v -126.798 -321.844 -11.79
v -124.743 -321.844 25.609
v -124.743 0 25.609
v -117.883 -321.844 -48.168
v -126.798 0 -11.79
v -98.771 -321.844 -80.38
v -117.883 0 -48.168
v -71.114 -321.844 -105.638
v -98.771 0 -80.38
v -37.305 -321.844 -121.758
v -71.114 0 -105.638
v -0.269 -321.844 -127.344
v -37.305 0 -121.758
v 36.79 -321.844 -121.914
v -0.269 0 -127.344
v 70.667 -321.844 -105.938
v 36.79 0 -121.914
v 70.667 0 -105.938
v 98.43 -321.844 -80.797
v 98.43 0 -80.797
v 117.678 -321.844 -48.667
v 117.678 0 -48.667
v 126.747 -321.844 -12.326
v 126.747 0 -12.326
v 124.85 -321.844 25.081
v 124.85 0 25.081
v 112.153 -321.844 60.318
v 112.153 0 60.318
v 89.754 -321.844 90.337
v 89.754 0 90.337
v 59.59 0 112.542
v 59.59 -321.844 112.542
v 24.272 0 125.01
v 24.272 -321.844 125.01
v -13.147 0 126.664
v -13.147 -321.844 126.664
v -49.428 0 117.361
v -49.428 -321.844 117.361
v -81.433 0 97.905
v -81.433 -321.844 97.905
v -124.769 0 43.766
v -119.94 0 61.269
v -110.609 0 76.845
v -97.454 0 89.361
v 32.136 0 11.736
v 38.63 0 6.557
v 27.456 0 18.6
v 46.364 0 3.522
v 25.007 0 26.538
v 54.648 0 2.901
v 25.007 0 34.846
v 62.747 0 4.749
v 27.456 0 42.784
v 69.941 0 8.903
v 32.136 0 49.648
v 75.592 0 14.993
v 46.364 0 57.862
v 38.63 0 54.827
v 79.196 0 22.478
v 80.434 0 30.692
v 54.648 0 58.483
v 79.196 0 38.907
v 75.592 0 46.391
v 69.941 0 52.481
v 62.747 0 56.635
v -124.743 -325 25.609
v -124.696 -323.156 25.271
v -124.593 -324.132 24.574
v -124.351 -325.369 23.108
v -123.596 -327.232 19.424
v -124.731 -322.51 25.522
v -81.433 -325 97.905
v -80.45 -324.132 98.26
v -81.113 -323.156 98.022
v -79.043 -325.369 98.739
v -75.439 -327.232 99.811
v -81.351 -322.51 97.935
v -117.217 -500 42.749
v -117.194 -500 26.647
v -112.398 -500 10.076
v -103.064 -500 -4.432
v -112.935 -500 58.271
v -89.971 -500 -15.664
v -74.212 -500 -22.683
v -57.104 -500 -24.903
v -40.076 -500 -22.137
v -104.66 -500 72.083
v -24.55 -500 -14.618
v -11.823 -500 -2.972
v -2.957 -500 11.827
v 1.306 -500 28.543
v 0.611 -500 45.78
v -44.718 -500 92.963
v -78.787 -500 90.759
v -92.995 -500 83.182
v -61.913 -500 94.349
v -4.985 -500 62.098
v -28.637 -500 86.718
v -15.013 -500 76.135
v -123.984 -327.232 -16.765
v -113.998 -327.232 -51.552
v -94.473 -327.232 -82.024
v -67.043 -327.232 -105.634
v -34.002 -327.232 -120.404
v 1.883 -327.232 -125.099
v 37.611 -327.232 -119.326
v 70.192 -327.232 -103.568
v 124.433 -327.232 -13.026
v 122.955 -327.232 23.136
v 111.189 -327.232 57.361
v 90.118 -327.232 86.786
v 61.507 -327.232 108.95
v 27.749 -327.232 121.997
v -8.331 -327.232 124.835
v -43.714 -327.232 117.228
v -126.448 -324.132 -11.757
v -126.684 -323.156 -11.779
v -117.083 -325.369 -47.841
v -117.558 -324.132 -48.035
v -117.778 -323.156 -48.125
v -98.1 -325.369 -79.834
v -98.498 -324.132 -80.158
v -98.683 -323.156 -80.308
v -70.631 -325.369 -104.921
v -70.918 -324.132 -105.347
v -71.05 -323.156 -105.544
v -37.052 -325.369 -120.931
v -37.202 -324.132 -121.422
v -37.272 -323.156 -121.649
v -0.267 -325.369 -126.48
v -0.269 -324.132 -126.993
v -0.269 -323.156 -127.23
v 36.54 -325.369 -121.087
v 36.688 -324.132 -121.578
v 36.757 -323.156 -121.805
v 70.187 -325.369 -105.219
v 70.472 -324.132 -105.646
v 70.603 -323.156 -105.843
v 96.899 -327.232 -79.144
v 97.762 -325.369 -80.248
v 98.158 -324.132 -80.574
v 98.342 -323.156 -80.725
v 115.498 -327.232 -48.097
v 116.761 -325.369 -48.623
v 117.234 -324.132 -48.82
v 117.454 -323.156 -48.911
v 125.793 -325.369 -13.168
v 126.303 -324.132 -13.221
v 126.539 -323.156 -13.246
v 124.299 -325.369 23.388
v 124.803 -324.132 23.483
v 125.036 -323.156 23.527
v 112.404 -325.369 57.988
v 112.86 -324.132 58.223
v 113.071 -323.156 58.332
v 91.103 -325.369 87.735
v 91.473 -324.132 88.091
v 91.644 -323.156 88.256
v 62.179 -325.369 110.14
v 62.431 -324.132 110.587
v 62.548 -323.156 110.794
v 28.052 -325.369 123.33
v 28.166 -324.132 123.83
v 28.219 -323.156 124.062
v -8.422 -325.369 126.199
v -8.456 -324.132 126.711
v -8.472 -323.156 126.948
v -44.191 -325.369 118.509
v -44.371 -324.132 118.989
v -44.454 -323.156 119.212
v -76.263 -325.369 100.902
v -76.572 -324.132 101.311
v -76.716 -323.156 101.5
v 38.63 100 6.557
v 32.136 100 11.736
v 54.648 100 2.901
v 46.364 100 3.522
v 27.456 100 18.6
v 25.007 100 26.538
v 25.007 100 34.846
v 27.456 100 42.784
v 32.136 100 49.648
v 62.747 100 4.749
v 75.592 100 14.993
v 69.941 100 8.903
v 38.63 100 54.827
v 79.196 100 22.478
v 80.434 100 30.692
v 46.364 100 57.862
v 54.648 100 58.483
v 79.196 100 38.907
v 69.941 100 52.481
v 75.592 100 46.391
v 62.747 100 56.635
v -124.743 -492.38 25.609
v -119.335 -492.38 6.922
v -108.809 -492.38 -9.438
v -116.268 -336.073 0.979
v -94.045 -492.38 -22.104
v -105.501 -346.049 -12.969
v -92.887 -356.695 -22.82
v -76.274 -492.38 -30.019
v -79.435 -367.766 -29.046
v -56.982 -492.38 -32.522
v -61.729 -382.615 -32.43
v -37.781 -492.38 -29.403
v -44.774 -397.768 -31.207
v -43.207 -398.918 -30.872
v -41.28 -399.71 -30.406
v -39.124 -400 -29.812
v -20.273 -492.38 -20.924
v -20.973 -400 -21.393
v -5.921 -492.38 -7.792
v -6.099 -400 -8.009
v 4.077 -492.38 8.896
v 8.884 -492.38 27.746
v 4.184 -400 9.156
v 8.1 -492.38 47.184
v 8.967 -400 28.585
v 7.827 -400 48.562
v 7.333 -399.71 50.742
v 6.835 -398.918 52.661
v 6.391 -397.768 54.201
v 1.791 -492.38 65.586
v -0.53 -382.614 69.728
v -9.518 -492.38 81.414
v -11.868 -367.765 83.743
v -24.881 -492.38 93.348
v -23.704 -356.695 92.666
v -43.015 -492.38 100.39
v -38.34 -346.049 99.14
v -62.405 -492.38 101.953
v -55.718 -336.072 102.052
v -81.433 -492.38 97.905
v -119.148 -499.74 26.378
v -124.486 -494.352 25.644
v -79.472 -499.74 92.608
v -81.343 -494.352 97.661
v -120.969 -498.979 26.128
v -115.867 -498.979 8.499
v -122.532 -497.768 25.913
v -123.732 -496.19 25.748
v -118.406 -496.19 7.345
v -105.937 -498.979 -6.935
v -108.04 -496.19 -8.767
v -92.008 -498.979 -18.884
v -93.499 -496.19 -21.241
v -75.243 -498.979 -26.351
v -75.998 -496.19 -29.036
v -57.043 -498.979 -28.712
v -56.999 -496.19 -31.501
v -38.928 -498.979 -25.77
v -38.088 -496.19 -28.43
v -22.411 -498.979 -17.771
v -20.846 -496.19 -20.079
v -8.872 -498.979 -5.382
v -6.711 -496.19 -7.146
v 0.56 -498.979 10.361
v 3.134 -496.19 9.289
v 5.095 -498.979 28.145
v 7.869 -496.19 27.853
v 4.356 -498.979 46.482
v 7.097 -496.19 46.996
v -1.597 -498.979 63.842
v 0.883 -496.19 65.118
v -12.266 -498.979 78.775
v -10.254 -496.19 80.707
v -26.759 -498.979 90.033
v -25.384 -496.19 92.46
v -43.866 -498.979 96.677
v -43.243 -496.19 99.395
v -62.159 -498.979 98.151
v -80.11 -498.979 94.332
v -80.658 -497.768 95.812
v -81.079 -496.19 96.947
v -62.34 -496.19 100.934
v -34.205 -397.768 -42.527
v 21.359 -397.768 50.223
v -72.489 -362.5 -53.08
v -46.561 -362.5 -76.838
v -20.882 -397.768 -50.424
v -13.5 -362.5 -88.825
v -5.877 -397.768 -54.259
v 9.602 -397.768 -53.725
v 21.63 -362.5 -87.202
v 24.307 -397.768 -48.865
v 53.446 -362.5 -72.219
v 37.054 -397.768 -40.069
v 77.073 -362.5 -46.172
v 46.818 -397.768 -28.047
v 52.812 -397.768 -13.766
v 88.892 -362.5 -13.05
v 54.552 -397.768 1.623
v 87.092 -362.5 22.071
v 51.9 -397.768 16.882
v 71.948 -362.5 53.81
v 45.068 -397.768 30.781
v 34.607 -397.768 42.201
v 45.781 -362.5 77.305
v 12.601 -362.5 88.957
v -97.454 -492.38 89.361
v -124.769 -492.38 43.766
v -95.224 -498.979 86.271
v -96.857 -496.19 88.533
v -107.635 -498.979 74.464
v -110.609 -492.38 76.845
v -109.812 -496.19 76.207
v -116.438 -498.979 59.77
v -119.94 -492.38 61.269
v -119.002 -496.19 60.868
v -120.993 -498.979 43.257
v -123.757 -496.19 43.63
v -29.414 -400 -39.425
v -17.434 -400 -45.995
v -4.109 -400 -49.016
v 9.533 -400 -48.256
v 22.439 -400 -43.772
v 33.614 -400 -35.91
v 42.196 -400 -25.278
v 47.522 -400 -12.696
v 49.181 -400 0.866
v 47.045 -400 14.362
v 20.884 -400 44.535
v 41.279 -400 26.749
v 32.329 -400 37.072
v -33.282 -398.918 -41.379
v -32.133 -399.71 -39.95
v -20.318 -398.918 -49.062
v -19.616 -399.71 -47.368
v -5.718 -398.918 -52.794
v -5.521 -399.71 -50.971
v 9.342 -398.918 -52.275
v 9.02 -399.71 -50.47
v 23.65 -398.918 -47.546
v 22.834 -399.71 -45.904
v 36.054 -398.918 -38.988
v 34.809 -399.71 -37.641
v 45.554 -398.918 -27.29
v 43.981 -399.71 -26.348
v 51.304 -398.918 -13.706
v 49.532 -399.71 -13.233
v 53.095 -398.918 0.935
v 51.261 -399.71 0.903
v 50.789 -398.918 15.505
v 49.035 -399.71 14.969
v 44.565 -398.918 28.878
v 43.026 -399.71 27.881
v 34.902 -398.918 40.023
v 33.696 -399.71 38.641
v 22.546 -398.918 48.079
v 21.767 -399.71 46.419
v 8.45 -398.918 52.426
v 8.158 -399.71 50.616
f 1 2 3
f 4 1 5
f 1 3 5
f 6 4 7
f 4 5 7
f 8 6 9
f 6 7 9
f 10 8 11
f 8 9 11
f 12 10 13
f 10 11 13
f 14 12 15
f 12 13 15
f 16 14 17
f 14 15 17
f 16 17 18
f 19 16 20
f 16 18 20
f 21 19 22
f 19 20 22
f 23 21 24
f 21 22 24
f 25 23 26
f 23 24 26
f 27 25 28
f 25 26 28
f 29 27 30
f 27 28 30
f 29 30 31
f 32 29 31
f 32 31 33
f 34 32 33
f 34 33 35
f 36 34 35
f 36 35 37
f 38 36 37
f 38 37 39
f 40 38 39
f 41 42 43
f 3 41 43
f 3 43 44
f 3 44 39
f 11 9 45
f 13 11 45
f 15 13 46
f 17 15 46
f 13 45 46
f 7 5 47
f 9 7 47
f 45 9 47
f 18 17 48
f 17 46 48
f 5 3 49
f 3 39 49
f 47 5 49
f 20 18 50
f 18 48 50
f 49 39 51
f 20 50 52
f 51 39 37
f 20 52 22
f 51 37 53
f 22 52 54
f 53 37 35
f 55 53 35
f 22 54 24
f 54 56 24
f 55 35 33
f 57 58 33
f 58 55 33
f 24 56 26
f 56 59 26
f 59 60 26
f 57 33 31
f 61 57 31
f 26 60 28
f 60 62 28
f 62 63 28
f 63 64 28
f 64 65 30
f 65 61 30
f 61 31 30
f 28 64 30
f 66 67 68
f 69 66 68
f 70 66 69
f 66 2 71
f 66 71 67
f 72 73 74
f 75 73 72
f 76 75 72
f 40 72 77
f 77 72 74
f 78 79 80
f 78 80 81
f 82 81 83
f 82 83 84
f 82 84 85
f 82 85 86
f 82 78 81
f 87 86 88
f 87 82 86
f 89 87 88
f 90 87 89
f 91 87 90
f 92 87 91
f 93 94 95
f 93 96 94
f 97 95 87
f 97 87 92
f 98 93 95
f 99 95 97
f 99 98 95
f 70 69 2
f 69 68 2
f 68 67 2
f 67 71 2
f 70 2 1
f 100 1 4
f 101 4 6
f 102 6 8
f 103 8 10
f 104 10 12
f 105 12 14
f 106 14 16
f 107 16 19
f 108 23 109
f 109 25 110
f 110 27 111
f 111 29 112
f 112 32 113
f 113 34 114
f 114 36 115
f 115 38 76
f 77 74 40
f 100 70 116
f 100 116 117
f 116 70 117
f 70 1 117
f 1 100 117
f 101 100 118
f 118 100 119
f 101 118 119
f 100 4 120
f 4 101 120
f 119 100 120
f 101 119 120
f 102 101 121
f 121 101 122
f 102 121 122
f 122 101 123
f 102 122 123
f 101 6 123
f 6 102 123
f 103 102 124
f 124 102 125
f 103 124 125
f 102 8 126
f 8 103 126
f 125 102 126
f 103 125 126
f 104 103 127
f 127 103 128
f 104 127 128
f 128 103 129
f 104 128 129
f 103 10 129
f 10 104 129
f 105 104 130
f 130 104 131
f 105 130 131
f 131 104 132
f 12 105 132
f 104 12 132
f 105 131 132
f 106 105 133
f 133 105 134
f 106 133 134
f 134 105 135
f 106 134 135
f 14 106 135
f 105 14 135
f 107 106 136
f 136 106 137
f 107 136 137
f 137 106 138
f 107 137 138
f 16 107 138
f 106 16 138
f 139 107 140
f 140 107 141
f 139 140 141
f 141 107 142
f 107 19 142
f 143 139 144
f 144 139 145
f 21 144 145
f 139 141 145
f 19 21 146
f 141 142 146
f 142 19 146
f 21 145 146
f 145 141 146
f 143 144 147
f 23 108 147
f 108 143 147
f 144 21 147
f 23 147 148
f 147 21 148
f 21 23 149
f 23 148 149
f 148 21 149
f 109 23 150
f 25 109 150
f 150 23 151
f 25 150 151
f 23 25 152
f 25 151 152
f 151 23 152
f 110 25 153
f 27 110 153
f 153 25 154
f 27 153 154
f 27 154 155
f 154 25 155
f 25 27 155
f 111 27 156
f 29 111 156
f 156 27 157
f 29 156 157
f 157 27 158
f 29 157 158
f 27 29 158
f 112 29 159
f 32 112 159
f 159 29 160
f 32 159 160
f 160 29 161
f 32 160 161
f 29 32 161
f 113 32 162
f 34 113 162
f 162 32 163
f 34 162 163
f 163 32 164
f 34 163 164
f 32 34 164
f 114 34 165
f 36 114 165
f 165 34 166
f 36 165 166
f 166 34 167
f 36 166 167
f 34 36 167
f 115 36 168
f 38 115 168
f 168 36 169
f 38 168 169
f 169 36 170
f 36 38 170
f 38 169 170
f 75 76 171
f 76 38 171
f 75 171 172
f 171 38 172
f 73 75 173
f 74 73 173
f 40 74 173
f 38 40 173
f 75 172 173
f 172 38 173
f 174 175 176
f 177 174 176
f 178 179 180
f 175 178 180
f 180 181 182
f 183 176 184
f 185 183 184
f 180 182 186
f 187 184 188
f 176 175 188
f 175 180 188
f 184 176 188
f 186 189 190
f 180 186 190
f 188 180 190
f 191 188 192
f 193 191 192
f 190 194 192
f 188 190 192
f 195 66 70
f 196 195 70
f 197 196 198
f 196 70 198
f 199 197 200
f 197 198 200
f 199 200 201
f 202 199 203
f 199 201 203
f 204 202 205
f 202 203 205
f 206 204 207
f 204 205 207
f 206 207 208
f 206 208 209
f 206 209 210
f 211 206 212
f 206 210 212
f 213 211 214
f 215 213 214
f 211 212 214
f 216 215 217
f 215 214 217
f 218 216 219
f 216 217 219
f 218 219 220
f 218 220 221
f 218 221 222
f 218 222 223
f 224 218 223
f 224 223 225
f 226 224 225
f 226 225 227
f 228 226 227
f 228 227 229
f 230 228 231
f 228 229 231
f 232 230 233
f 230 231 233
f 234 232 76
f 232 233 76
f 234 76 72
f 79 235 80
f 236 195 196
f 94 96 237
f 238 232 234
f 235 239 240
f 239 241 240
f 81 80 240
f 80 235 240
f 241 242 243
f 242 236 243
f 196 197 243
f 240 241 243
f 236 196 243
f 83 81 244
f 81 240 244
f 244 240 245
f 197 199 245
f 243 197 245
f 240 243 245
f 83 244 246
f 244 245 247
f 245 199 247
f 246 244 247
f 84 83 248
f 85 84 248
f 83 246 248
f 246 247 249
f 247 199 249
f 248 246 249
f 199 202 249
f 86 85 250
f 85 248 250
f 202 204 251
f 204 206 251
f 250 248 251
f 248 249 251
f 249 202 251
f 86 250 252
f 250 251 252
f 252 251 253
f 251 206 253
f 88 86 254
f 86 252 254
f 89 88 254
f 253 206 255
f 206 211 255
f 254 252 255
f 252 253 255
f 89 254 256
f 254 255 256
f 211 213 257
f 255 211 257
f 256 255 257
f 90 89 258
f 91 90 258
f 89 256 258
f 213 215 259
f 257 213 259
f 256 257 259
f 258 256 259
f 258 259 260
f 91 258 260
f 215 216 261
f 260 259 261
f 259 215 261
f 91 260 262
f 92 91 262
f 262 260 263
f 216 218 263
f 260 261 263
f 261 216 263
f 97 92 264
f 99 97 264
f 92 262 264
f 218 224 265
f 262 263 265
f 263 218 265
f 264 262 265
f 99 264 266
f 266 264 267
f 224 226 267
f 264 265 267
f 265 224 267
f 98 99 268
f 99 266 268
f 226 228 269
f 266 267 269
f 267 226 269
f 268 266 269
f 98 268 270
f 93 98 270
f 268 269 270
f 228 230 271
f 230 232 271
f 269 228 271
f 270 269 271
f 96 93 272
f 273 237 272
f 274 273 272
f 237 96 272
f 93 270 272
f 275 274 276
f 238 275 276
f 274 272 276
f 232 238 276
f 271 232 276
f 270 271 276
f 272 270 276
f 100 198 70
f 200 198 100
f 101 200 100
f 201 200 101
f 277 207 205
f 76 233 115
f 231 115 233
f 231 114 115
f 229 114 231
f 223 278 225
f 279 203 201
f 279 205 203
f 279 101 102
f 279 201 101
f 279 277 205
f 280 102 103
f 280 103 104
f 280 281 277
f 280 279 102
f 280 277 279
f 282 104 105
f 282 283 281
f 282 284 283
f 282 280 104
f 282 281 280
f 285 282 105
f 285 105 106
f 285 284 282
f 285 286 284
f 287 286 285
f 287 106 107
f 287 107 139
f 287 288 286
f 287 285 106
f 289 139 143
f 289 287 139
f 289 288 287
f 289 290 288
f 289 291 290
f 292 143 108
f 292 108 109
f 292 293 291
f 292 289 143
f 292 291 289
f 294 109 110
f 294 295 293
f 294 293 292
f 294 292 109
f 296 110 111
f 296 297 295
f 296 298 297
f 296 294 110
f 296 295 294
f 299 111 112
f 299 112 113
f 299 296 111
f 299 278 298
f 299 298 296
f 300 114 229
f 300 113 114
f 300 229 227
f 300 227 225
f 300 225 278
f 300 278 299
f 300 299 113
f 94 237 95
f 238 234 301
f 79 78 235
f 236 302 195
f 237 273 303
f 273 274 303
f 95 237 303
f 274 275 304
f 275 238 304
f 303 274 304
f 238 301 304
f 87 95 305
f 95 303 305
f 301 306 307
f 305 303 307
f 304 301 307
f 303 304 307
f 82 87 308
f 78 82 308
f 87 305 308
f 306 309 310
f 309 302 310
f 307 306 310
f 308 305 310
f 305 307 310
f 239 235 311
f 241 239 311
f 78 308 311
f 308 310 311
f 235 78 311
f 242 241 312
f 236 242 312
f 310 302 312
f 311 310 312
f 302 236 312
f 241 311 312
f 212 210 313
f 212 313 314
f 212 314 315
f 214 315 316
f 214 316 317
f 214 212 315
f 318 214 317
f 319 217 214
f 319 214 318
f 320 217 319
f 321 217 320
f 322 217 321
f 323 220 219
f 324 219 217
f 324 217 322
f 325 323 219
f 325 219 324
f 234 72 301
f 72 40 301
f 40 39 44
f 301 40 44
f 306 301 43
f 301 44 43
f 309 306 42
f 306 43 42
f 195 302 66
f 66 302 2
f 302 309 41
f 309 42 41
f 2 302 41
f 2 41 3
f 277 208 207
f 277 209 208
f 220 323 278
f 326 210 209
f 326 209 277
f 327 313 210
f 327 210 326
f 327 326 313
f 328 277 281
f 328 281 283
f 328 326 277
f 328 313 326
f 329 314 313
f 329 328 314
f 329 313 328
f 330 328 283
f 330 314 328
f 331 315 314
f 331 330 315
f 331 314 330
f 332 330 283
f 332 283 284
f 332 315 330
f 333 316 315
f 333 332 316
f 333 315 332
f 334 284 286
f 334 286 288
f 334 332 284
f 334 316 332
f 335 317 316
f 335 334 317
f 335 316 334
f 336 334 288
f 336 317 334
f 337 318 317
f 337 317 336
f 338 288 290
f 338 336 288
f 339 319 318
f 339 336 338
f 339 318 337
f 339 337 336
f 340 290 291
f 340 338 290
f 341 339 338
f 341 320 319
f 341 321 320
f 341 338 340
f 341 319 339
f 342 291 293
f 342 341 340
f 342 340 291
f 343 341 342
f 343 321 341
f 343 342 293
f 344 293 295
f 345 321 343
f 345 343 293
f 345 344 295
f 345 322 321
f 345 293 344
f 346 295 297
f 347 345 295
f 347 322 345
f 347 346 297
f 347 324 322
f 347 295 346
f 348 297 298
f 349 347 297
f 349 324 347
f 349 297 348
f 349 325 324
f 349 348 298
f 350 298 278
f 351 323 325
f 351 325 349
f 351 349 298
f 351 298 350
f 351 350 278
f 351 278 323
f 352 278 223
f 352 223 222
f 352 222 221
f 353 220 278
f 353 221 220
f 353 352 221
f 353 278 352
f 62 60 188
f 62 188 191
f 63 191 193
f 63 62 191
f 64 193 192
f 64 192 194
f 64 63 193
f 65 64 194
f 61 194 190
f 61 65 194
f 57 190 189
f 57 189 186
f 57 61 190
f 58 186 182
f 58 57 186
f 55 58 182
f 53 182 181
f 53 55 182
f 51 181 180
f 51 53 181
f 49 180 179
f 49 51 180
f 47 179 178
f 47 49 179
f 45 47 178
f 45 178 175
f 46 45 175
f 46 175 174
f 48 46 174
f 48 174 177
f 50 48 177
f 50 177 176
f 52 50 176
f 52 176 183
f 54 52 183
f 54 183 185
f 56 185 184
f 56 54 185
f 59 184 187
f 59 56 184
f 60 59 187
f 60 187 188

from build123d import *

# Parameters (mm, degrees)
F1_DEPTH    = 500
F0_R        = 27.8691255666
F2_DEPTH    = 400
F3_DEPTH    = 100
F4_SIZE     = 75
F5_R        = 7.62
F6_R        = 7.62
F7_T4_ANGLE = 328.4905382485
F7_S5_R     = 67.3118629199
F7_T6_DEPTH = 190


# Not quite as in the source:
# - a fillet or chamfer that OpenCascade refuses, or shapes differently, is made with other operations: its cross-section is extruded or revolved along the edge and cut away or added


with BuildPart() as f1:
    # F0 (on Front) → F1 (new body)
    with BuildSketch(Plane.XZ):
        with BuildLine():
            ThreePointArc((9.2527889353, 34.7813107073), (-19.6042711183, 90.0272610229), (-81.4330097892, 97.9045711963))
            ThreePointArc((-81.4330097892, 97.9045711963), (-109.241980875, 65.4433324256), (-124.7430483487, 25.6088272504))
            ThreePointArc((-124.7430483487, 25.6088272504), (-53.4620995229, -32.373396615), (9.2527889353, 34.7813107073))
        make_face()
        with BuildLine():
            ThreePointArc((-124.7430483487, 25.6088272504), (-109.241980875, 65.4433324256), (-81.4330097892, 97.9045711963))
            ThreePointArc((-81.4330097892, 97.9045711963), (-115.8022592462, 69.3733827123), (-124.7430483487, 25.6088272504))
        make_face()
    extrude(amount=F1_DEPTH)

    # F0 (on Front) → F2 (join)
    with BuildSketch(Plane.XZ):
        with BuildLine():
            ThreePointArc((-124.7430483487, 25.6088272504), (-12.870314303, -126.6925220927), (127.3445724971, 0))
            ThreePointArc((127.3445724971, 0), (54.0674963619, 115.2967735091), (-81.4330097892, 97.9045711963))
            ThreePointArc((-81.4330097892, 97.9045711963), (-19.6042711183, 90.0272610229), (9.2527889353, 34.7813107073))
            ThreePointArc((9.2527889353, 34.7813107073), (-53.4620995229, -32.373396615), (-124.7430483487, 25.6088272504))
        make_face()
        with Locations((52.5650605559, 30.6920967996)):
            Circle(F0_R, mode=Mode.SUBTRACT)
        with Locations((52.5650605559, 30.6920967996)):
            Circle(F0_R)
    extrude(amount=F2_DEPTH)

    # F0 (on Front) → F3 (join)
    with BuildSketch(Plane.XZ):
        with Locations((52.5650605559, 30.6920967996)):
            Circle(F0_R)
    extrude(amount=-F3_DEPTH)

    # F4
    f4_edges = [f1.edges().sort_by_distance(p)[0] for p in [
        (109.241981, -400, -65.443332),
    ]]
    chamfer(f4_edges, length=F4_SIZE)

    # F5
    f5_edges = [f1.edges().sort_by_distance(p)[0] for p in [
        (-125.370937, -500, 34.781311),
    ]]
    fillet(f5_edges, radius=F5_R)

    # F6
    f6_edges = [f1.edges().sort_by_distance(p)[0] for p in [
        (44.903561, -400, -26.900269),
    ]]
    fillet(f6_edges, radius=F6_R)

    # F7: fillet of radius 7.62 on 1 edges, made by hand


with BuildPart() as f7_tool2:
    # F7_s3 → F7_t4 (revolve)
    with BuildSketch(Plane(origin=(0, 0, 0), x_dir=(0, 1, 0), z_dir=(0.2616792898, 0, 0.9651548836))):
        with BuildLine():
            ThreePointArc((-327.2318463274, 125.1127261697), (-324.7597404093, 126.7645345348), (-321.8436926547, 127.3445724971))
            Line((-321.8436926547, 127.3445724971), (-325, 127.3445724971))
            Line((-325, 127.3445724971), (-327.2318463274, 125.1127261697))
        make_face()
    revolve(axis=Axis((0, -325, 0), (0, -1, 0)), revolution_arc=F7_T4_ANGLE)

    # F7_s5 → F7_t6 (cut, symmetric)
    with BuildSketch(Plane.XZ.offset(321.8)):
        with Locations((-58.0590739846, 34.7813107073)):
            Circle(F7_S5_R)
    extrude(amount=F7_T6_DEPTH, both=True, mode=Mode.SUBTRACT)


with BuildPart() as f1_1:
    add(f1.part)

    # F7_t1: cut F7_tool2
    add(f7_tool2.part, mode=Mode.SUBTRACT)


solid = f1_1.part
